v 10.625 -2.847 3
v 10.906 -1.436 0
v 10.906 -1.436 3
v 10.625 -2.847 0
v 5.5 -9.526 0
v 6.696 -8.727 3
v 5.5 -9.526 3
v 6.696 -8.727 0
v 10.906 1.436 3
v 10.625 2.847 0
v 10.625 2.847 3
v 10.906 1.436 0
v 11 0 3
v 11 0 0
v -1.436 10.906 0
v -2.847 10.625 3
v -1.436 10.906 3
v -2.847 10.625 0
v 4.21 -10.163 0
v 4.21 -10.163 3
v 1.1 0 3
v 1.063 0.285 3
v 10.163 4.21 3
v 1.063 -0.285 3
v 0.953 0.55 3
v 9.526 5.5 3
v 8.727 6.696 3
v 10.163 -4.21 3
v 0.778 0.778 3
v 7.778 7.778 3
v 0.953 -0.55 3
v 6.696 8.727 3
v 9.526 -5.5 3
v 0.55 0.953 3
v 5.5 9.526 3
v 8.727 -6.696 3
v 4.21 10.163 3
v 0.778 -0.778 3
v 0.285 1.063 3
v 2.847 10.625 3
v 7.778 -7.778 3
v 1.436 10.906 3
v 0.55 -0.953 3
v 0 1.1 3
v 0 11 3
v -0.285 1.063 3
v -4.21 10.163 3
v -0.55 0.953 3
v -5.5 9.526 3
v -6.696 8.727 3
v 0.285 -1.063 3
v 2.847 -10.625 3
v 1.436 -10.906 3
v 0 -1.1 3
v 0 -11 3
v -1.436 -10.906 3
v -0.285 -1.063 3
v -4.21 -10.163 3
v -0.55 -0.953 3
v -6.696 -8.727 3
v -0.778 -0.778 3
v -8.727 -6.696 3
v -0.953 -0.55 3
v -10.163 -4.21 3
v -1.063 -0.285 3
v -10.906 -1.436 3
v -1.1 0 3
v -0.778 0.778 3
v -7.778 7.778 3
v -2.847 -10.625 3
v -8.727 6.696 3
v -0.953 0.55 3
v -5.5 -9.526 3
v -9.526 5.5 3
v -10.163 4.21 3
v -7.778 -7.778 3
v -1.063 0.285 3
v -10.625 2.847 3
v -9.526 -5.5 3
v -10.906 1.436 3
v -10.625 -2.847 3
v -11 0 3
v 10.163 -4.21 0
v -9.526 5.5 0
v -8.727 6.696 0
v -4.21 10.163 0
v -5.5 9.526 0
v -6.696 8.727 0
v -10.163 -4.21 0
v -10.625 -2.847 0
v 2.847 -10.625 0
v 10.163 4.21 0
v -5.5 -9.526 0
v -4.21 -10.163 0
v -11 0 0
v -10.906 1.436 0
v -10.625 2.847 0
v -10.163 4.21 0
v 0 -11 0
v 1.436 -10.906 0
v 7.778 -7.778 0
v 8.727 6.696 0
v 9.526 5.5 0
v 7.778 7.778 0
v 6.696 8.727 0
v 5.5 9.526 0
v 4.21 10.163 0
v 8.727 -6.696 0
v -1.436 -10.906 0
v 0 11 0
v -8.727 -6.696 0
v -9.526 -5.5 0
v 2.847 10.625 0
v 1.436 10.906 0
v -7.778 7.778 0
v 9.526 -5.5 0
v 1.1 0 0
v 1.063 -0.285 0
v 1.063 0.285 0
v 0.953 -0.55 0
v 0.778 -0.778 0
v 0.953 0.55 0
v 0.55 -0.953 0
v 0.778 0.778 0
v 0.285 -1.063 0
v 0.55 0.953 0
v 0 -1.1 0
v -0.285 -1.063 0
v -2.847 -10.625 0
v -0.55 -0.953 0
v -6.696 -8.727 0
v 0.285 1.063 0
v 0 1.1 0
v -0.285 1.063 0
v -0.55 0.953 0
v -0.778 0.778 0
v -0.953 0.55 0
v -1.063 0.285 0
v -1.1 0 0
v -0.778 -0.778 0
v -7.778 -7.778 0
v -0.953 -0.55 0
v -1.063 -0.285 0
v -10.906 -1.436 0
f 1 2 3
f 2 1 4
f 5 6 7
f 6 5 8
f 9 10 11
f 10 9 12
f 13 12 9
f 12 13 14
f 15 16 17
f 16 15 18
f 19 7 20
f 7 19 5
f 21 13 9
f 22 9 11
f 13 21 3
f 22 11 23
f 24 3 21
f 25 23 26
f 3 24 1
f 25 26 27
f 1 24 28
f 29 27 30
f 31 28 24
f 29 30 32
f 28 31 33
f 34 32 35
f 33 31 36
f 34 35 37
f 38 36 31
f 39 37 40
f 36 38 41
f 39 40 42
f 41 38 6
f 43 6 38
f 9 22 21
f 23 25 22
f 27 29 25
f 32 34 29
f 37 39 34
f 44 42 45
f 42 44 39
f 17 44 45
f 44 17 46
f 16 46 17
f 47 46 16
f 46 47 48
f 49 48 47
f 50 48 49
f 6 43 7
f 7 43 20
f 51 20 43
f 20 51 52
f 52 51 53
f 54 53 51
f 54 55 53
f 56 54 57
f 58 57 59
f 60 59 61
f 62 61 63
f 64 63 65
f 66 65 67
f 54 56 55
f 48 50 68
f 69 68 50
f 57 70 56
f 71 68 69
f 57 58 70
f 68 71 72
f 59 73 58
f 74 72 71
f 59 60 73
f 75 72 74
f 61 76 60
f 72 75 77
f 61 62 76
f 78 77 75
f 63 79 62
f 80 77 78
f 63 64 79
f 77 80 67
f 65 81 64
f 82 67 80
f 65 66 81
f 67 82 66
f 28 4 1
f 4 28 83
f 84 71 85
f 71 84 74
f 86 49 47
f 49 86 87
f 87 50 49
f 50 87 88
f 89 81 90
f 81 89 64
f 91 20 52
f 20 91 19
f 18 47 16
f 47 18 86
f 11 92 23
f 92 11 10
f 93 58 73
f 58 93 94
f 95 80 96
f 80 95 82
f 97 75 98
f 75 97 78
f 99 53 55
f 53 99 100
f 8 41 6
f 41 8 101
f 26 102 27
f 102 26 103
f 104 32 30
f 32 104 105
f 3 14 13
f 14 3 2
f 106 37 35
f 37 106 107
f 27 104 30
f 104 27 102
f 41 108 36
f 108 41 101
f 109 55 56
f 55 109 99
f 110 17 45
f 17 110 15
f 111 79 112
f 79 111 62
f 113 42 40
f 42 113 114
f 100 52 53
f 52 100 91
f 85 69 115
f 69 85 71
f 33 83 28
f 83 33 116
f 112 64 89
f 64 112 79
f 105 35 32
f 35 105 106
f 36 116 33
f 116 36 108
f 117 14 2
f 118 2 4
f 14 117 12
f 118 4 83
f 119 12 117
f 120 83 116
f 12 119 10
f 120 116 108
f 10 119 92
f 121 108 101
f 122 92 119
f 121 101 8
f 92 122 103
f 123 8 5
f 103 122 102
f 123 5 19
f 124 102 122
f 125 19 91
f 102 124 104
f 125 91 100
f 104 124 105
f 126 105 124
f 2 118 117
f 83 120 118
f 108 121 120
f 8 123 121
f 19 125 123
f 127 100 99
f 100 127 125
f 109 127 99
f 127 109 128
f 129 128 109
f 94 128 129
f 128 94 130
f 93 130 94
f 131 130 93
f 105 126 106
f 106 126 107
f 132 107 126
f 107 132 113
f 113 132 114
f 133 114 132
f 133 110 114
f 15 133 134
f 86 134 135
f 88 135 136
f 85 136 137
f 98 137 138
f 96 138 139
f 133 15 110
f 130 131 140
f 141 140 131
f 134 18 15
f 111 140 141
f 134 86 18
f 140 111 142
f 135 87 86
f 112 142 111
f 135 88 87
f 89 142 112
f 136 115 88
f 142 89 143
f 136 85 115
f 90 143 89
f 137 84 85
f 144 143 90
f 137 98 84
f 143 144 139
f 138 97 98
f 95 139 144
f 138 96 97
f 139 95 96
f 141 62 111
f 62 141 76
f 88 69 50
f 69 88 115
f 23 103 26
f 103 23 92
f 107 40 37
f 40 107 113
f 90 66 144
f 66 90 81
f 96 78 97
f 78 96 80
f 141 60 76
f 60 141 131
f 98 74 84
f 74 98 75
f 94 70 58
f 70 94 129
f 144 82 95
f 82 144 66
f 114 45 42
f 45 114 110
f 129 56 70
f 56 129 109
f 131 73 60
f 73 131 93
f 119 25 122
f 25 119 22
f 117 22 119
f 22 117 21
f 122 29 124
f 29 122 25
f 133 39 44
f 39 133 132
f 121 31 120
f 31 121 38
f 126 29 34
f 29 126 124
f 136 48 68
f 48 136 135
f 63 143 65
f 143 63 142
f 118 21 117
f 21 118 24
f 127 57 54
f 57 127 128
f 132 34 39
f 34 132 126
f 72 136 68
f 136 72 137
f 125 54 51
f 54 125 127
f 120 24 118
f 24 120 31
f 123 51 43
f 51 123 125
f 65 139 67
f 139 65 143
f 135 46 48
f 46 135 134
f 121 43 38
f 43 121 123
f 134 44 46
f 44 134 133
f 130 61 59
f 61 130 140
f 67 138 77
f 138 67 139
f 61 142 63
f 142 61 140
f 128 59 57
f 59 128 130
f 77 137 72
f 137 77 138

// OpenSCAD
// FA-130 Rotation Indicator Demo
// FA-130 回転インジケータデモ
//
// モーターシャフトに取り付ける回転確認用ディスク
// マルチカラー印刷対応（白ディスク + 黒パターン）
//
// パターン種類:
//   - radial: 放射状ストライプ（デフォルト、最も視認性が高い）
//   - sector: セクターパターン（白黒交互、ストロボ効果）
//   - arrow: 矢印パターン（回転方向識別可能）
//   - spiral: 螺旋パターン（既存、後方互換性）
//
// 推奨設定:
//   - 低速（< 500 RPM）: pattern_type="arrow", mark_count=6-8
//   - 中速（500-2000 RPM）: pattern_type="radial", mark_count=12（デフォルト）
//   - 高速（> 2000 RPM）: pattern_type="sector", mark_count=16-24
//
// 外形: 直径 22mm x 厚さ 3mm（デフォルト）
// 使用モーター: FA-130 x1
//
// ビルド:
//   openscad --enable=lazy-union -O export-3mf/material-type=color \
//     -o fa130_indicator_demo.3mf fa130_indicator_demo.scad

include <../mabuchi_motor.scad>

// ===== Customizer パラメータ =====

/* [ディスク設定] */
// ディスク直径
disc_d = 22; // [20:1:50]

// ディスク厚さ
disc_h = 3; // [2:0.5:5]

// ハブ直径（シャフト穴周囲の補強）
hub_d = 10; // [8:1:15]

// シャフト穴クリアランス（3Dプリント検証済み）
shaft_tolerance = 0.2; // [0.1:0.1:0.5]

/* [パターン設定] */
// パターン種類（デフォルト: radial = 最も視認性が高い）
pattern_type = "radial"; // ["radial":放射状ストライプ, "sector":セクターパターン, "arrow":矢印パターン, "spiral":螺旋]

// パターン深さ（インレイ用）
pattern_depth = 0.6; // [0.4:0.1:1.0]

// マーク数（radial, sector, arrow用）
mark_count = 12; // [6:1:24]

// マーク幅比率（radial用）
mark_width_ratio = 0.4; // [0.2:0.05:0.8]

// 矢印サイズ比率（arrow用）
arrow_size_ratio = 0.3; // [0.2:0.05:0.5]

/* [螺旋設定（spiral用）] */
// 渦巻きの幅
spiral_w = 1.5; // [1:0.5:3]

// 渦巻きの巻き数
spiral_turns = 2; // [1:0.5:4]

// ===== モジュール =====

// ----- ヘルパーモジュール -----

// 扇形（pie slice）生成
// r_inner: 内径、r_outer: 外径、angle: 角度（度）
module pie_slice_2d(r_inner, r_outer, angle) {
    intersection() {
        difference() {
            circle(r = r_outer, $fn = 96);
            circle(r = r_inner, $fn = 48);
        }
        polygon([
            [0, 0],
            [r_outer * cos(-angle/2), r_outer * sin(-angle/2)],
            [r_outer * cos(angle/2), r_outer * sin(angle/2)]
        ]);
    }
}

// 矢印形状生成（シェブロン形状）
// length: 矢印の長さ、width: 矢印の幅
module arrow_2d(length, width) {
    polygon([
        [-length/2, -width/2],
        [length/2, 0],
        [-length/2, width/2]
    ]);
}

// ----- パターン生成モジュール -----

// 放射状ストライプパターン
// r_inner: 内径、r_outer: 外径、count: ストライプ数、width_ratio: 幅比率（0-1）
module radial_stripes_2d(r_inner, r_outer, count, width_ratio) {
    angle_step = 360 / count;
    stripe_angle = angle_step * width_ratio;

    for (i = [0:count-1]) {
        rotate([0, 0, i * angle_step])
            pie_slice_2d(r_inner, r_outer, stripe_angle);
    }
}

// セクターパターン（白黒交互の扇形）
// r_inner: 内径、r_outer: 外径、count: セクター数（偶数推奨）
module sector_pattern_2d(r_inner, r_outer, count) {
    angle_step = 360 / count;

    for (i = [0:count-1]) {
        if (i % 2 == 0) {  // 偶数番目のみ描画（交互配置）
            rotate([0, 0, i * angle_step])
                pie_slice_2d(r_inner, r_outer, angle_step);
        }
    }
}

// 矢印パターン
// r_inner: 内径、r_outer: 外径、count: 矢印数、arrow_size_ratio: 矢印サイズ比率
module arrow_pattern_2d(r_inner, r_outer, count, arrow_size_ratio) {
    angle_step = 360 / count;
    arrow_length = (r_outer - r_inner) * arrow_size_ratio;
    arrow_width = arrow_length * 0.6;

    for (i = [0:count-1]) {
        rotate([0, 0, i * angle_step])
            translate([0, (r_inner + r_outer) / 2, 0])
                arrow_2d(arrow_length, arrow_width);
    }
}

// 渦巻き形状（2Dポリゴン）
// アルキメデスの螺旋: r = a + b * θ
module spiral_2d(r_inner, r_outer, width, turns, steps_per_turn = 36) {
    total_steps = turns * steps_per_turn;
    // 螺旋の成長率（1回転あたり幅 + 間隔分だけ成長）
    growth = (r_outer - r_inner) / turns;

    // 外側の螺旋点
    outer_points = [for (i = [0:total_steps])
        let(theta = i * 360 / steps_per_turn,
            r = r_inner + (i / steps_per_turn) * growth)
        [r * cos(theta), r * sin(theta)]
    ];

    // 内側の螺旋点（幅分だけ内側、逆順）
    inner_points = [for (i = [total_steps:-1:0])
        let(theta = i * 360 / steps_per_turn,
            r = max(r_inner - width/2, width/2) + (i / steps_per_turn) * growth - width/2)
        [r * cos(theta), r * sin(theta)]
    ];

    polygon(concat(outer_points, inner_points));
}

// ----- パターンディスパッチャー -----

// パターンタイプに応じて適切なパターンを生成
module indicator_pattern_2d(
    pattern_type,
    r_inner,
    r_outer,
    mark_count,
    mark_width_ratio,
    arrow_size_ratio,
    spiral_w,
    spiral_turns
) {
    if (pattern_type == "radial") {
        radial_stripes_2d(r_inner, r_outer, mark_count, mark_width_ratio);
    } else if (pattern_type == "sector") {
        sector_pattern_2d(r_inner, r_outer, mark_count);
    } else if (pattern_type == "arrow") {
        arrow_pattern_2d(r_inner, r_outer, mark_count, arrow_size_ratio);
    } else if (pattern_type == "spiral") {
        spiral_2d(r_inner, r_outer, spiral_w, spiral_turns);
    }
}

// ----- インジケータディスクモジュール -----

// ディスク本体（白）
module indicator_disc() {
    shaft_hole_r = (fa130_shaft_d + shaft_tolerance) / 2;
    r_inner = shaft_hole_r + 0.5;  // シャフト穴のすぐ外側から開始
    r_outer = disc_d / 2 - 1;      // 外周より少し内側まで

    difference() {
        cylinder(h = disc_h, d = disc_d, $fn = 48);
        // シャフト穴
        translate([0, 0, -0.1])
            cylinder(h = disc_h + 0.2, d = fa130_shaft_d + shaft_tolerance, $fn = 24);
        // パターンのくり抜き（上面）
        translate([0, 0, disc_h - pattern_depth])
            linear_extrude(height = pattern_depth + 0.1)
                indicator_pattern_2d(pattern_type, r_inner, r_outer,
                                     mark_count, mark_width_ratio,
                                     arrow_size_ratio, spiral_w, spiral_turns);
    }
}

// パターン（黒）
module indicator_pattern() {
    shaft_hole_r = (fa130_shaft_d + shaft_tolerance) / 2;
    r_inner = shaft_hole_r + 0.5;  // シャフト穴のすぐ外側から開始
    r_outer = disc_d / 2 - 1;

    translate([0, 0, disc_h - pattern_depth])
        linear_extrude(height = pattern_depth)
            indicator_pattern_2d(pattern_type, r_inner, r_outer,
                                 mark_count, mark_width_ratio,
                                 arrow_size_ratio, spiral_w, spiral_turns);
}

// ===== 出力 =====

// 白ディスク
color("white")
indicator_disc();

// 黒パターン
color("black")
indicator_pattern();
